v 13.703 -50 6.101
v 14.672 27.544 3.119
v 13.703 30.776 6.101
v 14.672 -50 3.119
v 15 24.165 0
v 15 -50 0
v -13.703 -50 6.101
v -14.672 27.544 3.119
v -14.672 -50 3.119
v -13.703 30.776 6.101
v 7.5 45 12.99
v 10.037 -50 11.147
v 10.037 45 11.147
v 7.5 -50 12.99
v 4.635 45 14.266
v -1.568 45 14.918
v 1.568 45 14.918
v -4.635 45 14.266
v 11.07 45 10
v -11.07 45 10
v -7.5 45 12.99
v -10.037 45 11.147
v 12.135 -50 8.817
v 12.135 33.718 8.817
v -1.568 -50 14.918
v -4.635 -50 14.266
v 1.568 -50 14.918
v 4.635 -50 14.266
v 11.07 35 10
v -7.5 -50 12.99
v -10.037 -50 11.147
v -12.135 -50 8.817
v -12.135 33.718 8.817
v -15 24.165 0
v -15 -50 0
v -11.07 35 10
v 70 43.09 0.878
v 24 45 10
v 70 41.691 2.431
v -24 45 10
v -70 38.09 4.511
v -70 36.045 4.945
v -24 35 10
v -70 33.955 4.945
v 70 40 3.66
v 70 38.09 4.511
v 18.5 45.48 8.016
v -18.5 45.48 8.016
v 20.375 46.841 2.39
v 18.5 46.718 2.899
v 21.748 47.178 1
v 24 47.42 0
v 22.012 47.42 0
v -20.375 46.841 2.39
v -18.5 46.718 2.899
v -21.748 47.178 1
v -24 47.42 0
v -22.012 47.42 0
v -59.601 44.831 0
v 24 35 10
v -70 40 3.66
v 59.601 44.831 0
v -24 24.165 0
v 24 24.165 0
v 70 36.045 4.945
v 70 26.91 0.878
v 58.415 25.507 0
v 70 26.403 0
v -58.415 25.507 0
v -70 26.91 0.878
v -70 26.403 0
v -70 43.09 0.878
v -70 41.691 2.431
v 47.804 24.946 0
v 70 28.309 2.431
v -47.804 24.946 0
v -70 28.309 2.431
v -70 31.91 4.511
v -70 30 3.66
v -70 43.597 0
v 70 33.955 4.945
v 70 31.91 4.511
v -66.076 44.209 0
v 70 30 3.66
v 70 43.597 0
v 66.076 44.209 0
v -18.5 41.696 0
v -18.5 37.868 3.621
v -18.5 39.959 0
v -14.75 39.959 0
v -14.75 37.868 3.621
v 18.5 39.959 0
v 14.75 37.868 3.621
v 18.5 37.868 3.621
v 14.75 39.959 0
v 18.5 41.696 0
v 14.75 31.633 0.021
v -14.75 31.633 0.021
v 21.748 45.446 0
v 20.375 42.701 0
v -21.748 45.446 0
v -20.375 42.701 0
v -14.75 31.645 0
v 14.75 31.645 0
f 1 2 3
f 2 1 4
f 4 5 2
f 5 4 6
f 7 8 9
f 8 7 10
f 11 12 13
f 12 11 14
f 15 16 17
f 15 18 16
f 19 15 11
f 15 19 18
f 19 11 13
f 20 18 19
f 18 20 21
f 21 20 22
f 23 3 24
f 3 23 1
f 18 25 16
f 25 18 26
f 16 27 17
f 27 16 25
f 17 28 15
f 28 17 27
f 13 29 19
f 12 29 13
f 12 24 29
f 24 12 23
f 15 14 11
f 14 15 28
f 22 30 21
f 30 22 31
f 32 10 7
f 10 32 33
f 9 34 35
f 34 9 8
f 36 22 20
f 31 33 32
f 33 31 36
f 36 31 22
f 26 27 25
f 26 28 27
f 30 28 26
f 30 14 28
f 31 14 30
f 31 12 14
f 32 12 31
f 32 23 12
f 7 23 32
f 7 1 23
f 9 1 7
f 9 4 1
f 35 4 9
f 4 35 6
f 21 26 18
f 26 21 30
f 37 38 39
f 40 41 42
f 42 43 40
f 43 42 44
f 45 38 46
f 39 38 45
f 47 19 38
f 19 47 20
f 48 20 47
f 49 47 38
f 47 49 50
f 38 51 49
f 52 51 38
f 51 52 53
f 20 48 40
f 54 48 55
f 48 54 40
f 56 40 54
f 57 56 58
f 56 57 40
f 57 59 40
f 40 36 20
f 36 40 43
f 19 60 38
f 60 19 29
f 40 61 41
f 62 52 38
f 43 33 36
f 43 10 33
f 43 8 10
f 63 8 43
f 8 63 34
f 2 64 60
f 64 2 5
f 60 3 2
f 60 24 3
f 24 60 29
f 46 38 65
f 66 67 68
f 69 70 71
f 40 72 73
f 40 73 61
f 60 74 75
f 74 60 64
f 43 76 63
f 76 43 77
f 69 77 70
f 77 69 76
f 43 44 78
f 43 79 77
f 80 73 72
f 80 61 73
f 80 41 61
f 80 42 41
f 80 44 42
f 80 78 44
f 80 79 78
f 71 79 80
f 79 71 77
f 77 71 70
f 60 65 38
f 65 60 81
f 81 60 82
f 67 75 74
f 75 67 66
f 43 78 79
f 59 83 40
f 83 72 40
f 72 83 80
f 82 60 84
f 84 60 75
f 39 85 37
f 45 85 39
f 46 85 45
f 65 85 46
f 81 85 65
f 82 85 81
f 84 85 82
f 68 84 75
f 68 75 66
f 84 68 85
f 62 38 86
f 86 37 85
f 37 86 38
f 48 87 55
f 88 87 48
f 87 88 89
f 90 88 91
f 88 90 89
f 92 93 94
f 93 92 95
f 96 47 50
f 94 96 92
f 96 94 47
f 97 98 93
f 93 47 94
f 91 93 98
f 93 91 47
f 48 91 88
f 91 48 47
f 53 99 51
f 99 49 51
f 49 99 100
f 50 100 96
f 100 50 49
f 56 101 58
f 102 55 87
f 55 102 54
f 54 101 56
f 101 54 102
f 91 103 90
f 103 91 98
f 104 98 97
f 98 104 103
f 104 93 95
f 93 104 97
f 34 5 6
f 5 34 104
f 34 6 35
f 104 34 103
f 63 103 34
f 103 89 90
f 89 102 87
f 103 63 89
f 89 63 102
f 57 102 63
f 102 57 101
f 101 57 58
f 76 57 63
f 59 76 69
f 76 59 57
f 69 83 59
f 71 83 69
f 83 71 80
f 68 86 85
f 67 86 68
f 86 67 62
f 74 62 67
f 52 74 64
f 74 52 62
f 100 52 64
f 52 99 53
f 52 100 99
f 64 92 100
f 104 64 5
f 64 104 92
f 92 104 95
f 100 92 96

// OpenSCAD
caster_wheel_mountx=30;
front_wheel_offset=115;

//motors
motor_length=86.6;
motor_thickness=30;
motor_axe=5;
motor_shaft=10;
motor_shaft_offset=5.5;
motor_shaft_length=2.5;
motor_axe_length=10;
motor_tapm3=3;
motor_tap_distance=12.5;
motor_tap_degrees=60;
// base_plate
base_plate_rear_width=(motor_length-motor_axe_length)*2+46.8;
base_plate_rear_length=200;
base_plate_front_width=caster_wheel_mountx*2;
base_plate_front_length=front_wheel_offset+base_plate_rear_length/2-15;
base_plate_thickness=4;

module base_plate() {
	hull() {
		color ("blue") translate ([0,0,0]) cube ([base_plate_rear_width,base_plate_rear_length,base_plate_thickness],true);
		color ("green") translate ([0,base_plate_front_length/2,0]) cube ([base_plate_front_width,base_plate_front_length,base_plate_thickness],true);
	}
}

// infrared sensor Sharp GP2Y0A21YK 10-80cm (front fallsensor)
sharp_distance=37;
sharp_width1=17.6;
sharp_width2=8.4;
sharp_width2=7.2;
sharp_height1=15.5;
sharp_height2=6.3;
sharp_height3=2;
sharp_inner=0.6;
sharp_length1=29.5;
sharp_length_receiver=16.3;
sharp_length_sender=7.5;
sharp_optic_distance=4.15;
sharp_length_radius=3.75;
sharp_tap_radius=3.2/2;
sharp_thickness=2;
module sharp() {
	difference() {
	union() {
	// base PCB
	color ("red") translate([0,0,sharp_thickness/2-15]) cube([sharp_distance,sharp_width1,sharp_thickness+30],true);
	color ("yellow") translate([-sharp_distance/2,0,-30]) cylinder(sharp_thickness+30,sharp_length_radius,sharp_length_radius);
	color ("yellow") translate([sharp_distance/2,0,-30]) cylinder(sharp_thickness+30,sharp_length_radius,sharp_length_radius);
	// cube1 to PCB
	color ("green") translate([0,0,(sharp_height1-sharp_height2)/2]) cube([sharp_length1,sharp_width1,sharp_height1-sharp_height2],true);
	// cube2 to cube1
	color ("blue") translate([0,0,sharp_height1/2]) cube([sharp_length1,sharp_width2,sharp_height1-sharp_height3+30],true);
	// cube3 sender
	color ("orange") translate([-sharp_length1/2+sharp_length_sender/2,0,sharp_height1/2]) cube([sharp_length_sender-sharp_inner*2,sharp_width2-sharp_inner*2,sharp_height1],true);
	// cube3 receiver (bigger one)
	color ("pink") translate([sharp_length1/2-sharp_length_receiver/2,0,sharp_height1/2]) cube([sharp_length_receiver-sharp_inner*2,sharp_width2-sharp_inner*2,sharp_height1],true);
	}
	union() {
	// taps
	*color ("brown") translate([-sharp_distance/2,0,-1]) cylinder(sharp_thickness+1.5,sharp_tap_radius,sharp_tap_radius);
	*color ("brown") translate([sharp_distance/2,0,-1]) cylinder(sharp_thickness+1.5,sharp_tap_radius,sharp_tap_radius);
	*color ("brown") translate([-sharp_length1/2+sharp_length_sender/2,0,sharp_height1-1]) cylinder(2,sharp_tap_radius+1.2,sharp_tap_radius+1.2);
	*color ("brown") translate([sharp_length1/2-sharp_length_sender/2,0,sharp_height1-1]) cylinder(2,sharp_tap_radius+1.2,sharp_tap_radius+1.2);
	}
	}
}





module lenker() {
difference() {
translate ([0,0,-50]) union(){

translate([0,0,0]) cylinder(95,15,15);

hull() {
translate([0,8,68+13+5]) rotate ([30,0,0]) cube([48,24,20],true);
translate([0,0,68+17+5]) cube([48,20,10],true);
translate([-70,5,100-20+5]) rotate ([0,90,0]) cylinder(140,10,10);
}


*translate([66,1+5,100-20+5]) rotate ([30,90,0]) cylinder(35,10,10); 
*translate([-96,154-170+5,100-20+5]) rotate ([-30,90,0]) cylinder(35,10,10); 
//vert
//translate([0,1,0]) rotate ([0,0,0]) cylinder(100,10,10); 

}

translate([0,18,-24-base_plate_thickness+5-50]) union() {
 translate([0,-15,112+5]) rotate([-30,180,0]) sharp();
}

}
}


module print_part1() {
difference() {
translate([]) rotate([90,0,0]) lenker();
translate ([0,0,-25]) cube([150,140,50],true);
}
}

module print_part2() {
difference() {
translate([]) rotate([90,0,0]) lenker();
translate ([0,0,25]) cube([150,140,50],true);
}
}


//print_part1();
//rotate ([180,0,0]) 
//print_part2();
rotate ([180,0,0]) print_part2();
